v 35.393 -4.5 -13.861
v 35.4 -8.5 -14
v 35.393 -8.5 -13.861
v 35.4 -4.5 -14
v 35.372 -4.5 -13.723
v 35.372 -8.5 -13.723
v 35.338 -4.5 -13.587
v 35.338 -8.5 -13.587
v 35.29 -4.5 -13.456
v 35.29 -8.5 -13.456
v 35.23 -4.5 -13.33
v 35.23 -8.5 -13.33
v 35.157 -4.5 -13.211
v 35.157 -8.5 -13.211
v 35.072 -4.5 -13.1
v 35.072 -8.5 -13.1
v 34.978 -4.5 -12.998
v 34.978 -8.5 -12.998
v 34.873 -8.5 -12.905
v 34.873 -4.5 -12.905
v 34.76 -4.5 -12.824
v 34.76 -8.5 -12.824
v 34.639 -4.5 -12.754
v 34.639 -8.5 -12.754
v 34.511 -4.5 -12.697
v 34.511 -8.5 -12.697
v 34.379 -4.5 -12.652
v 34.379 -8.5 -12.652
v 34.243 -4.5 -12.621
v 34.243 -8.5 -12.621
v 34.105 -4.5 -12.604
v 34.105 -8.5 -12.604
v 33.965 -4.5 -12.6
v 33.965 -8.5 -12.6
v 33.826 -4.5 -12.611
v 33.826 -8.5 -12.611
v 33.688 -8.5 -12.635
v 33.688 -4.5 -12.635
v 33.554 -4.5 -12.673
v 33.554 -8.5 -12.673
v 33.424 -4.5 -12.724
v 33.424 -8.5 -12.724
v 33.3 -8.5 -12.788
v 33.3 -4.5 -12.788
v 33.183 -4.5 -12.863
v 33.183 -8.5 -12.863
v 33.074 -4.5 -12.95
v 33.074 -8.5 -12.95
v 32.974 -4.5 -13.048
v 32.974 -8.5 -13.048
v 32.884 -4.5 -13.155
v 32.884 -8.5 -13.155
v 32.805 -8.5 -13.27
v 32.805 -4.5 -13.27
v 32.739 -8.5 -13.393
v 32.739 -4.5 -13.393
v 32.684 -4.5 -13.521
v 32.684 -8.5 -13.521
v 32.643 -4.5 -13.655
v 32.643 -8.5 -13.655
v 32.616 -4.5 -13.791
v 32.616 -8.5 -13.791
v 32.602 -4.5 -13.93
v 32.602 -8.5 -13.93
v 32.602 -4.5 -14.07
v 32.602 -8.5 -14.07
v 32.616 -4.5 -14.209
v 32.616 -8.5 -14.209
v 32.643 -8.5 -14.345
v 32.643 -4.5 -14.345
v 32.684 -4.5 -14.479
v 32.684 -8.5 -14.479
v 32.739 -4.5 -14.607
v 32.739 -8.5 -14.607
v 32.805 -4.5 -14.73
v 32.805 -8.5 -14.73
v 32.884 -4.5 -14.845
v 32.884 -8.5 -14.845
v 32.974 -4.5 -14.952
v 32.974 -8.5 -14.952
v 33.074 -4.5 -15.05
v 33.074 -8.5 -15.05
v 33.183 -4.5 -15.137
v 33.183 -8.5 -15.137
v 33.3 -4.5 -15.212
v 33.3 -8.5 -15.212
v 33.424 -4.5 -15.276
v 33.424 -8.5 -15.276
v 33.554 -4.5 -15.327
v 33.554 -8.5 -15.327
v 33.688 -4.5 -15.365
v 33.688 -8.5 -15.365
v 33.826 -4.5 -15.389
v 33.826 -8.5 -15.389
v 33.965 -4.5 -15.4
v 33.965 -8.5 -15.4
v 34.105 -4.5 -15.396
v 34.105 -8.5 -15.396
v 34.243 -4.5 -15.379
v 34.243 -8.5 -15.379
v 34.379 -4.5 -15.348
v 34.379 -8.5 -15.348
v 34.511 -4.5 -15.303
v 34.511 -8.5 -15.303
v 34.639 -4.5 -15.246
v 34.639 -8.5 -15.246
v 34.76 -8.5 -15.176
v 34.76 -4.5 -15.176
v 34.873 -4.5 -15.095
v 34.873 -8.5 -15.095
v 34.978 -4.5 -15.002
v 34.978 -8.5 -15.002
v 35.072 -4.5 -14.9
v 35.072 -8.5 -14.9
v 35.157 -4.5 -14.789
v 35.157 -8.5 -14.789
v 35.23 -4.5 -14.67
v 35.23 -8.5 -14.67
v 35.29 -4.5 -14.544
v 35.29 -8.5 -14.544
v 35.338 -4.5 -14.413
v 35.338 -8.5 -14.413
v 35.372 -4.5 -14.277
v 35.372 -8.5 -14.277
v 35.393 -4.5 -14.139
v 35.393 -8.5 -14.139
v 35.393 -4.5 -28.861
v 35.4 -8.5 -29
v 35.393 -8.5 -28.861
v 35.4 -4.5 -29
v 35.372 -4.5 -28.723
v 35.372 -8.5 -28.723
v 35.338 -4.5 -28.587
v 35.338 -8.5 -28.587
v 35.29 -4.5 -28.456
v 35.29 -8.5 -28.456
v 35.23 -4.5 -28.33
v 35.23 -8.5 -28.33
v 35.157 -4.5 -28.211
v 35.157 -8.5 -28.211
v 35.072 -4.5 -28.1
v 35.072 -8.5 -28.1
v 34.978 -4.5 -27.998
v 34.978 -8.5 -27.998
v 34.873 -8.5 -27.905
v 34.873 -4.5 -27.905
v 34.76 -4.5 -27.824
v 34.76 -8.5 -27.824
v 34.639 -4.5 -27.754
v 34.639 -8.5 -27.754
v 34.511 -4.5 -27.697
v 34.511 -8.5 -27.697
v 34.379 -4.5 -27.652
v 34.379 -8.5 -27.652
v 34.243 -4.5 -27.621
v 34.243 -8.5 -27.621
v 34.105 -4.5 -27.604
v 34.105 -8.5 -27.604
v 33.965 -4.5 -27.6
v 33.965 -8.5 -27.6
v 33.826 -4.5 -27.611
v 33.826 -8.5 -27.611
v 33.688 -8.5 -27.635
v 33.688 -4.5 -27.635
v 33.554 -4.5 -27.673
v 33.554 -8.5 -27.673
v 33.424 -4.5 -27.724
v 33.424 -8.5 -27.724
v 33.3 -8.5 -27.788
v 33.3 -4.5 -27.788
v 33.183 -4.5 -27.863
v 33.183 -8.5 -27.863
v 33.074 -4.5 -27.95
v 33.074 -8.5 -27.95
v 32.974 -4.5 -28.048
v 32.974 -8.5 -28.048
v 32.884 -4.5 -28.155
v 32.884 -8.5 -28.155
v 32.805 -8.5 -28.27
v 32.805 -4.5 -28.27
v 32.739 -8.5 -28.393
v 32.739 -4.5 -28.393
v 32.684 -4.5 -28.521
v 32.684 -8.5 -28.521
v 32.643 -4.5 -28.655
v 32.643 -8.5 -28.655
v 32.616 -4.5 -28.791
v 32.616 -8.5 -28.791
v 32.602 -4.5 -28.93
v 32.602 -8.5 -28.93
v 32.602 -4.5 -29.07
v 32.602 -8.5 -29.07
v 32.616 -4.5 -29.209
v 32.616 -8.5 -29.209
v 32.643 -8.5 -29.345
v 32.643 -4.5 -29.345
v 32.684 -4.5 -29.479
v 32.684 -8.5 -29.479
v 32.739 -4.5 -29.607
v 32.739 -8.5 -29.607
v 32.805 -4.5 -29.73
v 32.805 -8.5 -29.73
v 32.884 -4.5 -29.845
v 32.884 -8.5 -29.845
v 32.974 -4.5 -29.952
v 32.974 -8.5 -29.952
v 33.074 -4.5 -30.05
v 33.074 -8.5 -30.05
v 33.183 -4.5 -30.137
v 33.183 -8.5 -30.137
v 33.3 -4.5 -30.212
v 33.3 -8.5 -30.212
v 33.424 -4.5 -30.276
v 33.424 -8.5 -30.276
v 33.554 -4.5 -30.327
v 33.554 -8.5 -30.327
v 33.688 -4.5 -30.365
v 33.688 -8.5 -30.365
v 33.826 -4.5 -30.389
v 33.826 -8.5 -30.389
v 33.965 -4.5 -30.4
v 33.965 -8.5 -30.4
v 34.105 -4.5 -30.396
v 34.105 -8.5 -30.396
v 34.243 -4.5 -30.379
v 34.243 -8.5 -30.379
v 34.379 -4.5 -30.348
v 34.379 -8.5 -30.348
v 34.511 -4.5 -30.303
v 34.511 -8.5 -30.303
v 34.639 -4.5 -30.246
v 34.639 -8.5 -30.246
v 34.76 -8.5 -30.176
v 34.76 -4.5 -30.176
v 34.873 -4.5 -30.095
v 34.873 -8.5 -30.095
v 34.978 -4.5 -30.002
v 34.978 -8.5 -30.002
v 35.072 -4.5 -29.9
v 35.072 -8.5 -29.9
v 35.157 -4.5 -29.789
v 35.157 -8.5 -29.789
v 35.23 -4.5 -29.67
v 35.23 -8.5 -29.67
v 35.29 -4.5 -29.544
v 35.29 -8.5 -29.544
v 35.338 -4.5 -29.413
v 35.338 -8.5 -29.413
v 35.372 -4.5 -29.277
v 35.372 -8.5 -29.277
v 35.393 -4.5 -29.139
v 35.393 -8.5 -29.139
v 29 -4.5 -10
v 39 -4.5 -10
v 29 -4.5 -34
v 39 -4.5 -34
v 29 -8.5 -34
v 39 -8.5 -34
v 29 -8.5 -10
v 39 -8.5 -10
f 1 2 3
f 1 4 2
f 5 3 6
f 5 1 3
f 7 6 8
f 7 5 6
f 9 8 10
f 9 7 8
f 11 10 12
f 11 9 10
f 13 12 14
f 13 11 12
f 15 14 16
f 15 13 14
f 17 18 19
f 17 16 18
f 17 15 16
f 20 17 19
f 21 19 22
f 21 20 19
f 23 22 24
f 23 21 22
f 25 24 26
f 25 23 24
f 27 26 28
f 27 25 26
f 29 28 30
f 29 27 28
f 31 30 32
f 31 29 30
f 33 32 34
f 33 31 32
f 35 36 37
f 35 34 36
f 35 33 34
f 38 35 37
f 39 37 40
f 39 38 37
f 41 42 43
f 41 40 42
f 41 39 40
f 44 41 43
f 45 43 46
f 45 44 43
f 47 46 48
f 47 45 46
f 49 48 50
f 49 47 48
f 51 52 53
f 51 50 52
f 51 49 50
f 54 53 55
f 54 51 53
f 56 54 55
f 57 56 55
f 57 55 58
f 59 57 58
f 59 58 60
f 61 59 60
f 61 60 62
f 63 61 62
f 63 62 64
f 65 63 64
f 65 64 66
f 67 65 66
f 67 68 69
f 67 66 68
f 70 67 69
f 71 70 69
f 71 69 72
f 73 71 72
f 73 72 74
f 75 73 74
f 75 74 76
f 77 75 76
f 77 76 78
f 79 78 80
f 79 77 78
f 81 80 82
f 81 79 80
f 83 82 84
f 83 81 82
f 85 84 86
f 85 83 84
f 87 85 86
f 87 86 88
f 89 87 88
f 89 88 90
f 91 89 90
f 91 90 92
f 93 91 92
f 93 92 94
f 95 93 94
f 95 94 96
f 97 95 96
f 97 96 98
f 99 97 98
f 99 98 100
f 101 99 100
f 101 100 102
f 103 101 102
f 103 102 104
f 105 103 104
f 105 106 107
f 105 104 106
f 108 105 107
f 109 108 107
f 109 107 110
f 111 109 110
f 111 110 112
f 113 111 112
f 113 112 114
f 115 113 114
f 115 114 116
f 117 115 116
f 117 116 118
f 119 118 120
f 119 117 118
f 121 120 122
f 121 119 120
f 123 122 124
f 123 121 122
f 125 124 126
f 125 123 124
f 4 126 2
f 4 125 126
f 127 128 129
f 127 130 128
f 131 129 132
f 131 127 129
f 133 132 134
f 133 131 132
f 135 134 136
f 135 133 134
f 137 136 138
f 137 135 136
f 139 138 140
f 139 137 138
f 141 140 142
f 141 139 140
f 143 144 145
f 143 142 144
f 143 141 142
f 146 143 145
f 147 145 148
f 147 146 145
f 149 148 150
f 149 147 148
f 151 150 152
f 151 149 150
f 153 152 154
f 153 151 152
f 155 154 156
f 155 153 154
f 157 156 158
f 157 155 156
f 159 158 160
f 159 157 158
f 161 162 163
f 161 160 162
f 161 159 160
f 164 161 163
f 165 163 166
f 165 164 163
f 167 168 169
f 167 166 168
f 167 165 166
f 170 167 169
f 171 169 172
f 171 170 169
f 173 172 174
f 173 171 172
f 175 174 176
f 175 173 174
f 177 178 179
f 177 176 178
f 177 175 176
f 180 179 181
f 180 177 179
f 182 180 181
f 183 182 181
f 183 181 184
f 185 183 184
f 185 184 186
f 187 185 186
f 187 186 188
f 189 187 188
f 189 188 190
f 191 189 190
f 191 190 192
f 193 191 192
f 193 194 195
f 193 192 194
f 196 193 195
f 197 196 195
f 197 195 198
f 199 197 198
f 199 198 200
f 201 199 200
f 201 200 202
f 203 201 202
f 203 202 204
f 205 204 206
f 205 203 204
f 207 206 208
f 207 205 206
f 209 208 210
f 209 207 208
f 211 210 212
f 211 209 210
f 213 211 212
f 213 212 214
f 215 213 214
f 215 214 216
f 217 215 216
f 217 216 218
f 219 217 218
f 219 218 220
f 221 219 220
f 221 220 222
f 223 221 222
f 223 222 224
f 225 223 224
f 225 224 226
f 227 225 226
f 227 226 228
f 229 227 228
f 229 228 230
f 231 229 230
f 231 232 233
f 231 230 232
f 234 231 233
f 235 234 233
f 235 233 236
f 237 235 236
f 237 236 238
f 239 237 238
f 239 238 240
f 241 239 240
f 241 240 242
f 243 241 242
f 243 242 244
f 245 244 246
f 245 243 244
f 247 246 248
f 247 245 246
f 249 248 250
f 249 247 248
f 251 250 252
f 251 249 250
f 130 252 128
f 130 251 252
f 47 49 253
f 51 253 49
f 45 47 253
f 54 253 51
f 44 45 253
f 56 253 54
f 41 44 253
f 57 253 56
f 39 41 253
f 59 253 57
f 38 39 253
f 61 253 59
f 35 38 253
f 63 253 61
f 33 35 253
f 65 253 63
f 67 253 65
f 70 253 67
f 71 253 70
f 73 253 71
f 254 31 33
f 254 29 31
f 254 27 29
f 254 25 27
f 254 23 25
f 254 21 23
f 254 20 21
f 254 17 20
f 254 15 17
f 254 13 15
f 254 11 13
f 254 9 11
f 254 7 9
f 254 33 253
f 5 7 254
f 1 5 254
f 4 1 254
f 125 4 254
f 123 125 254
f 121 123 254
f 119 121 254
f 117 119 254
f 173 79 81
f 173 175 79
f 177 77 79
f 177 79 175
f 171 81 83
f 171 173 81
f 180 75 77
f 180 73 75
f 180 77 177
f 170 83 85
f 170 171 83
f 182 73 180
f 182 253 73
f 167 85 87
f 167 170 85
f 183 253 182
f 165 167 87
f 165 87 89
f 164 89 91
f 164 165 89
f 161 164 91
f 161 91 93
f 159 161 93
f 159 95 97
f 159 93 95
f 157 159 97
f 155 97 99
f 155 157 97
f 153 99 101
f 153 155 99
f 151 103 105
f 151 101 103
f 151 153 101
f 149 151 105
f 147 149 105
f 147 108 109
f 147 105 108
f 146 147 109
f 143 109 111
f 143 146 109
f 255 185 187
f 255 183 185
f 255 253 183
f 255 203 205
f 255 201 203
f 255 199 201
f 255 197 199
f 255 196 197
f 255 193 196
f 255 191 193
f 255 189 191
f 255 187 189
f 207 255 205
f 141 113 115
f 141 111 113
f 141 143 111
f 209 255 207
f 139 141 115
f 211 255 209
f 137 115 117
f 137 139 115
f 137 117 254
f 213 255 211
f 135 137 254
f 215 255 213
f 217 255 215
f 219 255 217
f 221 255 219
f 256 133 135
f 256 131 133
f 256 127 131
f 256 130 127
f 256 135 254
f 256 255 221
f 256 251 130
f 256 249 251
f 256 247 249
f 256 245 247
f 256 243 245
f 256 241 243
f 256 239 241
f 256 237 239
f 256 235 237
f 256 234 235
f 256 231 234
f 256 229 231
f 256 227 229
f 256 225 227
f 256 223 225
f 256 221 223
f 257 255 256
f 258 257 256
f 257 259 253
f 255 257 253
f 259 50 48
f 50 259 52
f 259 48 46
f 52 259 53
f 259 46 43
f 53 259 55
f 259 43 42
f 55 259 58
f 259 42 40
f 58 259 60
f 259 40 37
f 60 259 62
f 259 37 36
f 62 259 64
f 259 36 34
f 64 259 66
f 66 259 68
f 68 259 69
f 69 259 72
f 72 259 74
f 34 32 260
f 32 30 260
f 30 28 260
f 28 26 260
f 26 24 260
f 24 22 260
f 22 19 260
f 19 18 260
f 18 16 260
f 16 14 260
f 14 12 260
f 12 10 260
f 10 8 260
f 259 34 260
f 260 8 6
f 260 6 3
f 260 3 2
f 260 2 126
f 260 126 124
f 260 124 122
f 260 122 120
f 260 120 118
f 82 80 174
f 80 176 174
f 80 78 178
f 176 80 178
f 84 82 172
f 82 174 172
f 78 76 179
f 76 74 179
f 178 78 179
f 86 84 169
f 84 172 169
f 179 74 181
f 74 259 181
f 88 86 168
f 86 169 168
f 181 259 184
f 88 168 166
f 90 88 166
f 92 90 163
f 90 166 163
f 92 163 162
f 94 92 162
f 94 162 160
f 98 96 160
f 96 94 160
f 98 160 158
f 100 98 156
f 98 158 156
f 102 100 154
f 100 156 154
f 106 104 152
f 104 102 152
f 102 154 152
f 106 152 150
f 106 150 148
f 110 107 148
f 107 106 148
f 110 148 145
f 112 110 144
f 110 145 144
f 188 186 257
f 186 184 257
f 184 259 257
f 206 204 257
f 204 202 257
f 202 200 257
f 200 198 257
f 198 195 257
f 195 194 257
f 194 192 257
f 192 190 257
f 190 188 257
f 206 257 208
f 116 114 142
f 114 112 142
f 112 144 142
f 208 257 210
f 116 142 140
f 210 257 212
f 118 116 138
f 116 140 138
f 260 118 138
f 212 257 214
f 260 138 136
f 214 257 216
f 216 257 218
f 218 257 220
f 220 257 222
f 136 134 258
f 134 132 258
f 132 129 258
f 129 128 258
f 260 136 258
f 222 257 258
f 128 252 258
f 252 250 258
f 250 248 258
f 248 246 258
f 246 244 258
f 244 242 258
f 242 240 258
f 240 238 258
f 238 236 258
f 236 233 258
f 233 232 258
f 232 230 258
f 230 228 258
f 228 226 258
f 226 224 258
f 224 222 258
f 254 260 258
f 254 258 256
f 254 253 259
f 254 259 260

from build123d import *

# Parameters (mm, degrees)
CYLINDER231_R          = 1.4
CYLINDER231_DEPTH      = 20
CYLINDER231_ROLL_ANGLE = 90
CYLINDER230_R          = 1.4
CYLINDER230_DEPTH      = 20
CYLINDER230_ROLL_ANGLE = 90
BOX001027045174_W      = 10
BOX001027045174_H      = 4
BOX001027045174_DEPTH  = 24


with BuildPart() as m3_tap006:
    # Cylinder231 → Cylinder231 (new body)
    with BuildSketch(Plane.XY):
        Circle(CYLINDER231_R)
    extrude(amount=CYLINDER231_DEPTH)


with BuildPart() as m3_tap006_1:
    # Cylinder231 roll: moved
    add(m3_tap006.part.rotate(Axis((0, 0, 0), (1, 0, 0)), CYLINDER231_ROLL_ANGLE))


with BuildPart() as m3_tap006_2:
    # Cylinder231 placement: moved
    add(m3_tap006_1.part.moved(Location((34, 5, -29))))


with BuildPart() as fusion112123:
    # Cylinder230 → Cylinder230 (new body)
    with BuildSketch(Plane.XY):
        Circle(CYLINDER230_R)
    extrude(amount=CYLINDER230_DEPTH)


with BuildPart() as fusion112123_1:
    # Cylinder230 roll: moved
    add(fusion112123.part.rotate(Axis((0, 0, 0), (1, 0, 0)), CYLINDER230_ROLL_ANGLE))


with BuildPart() as fusion112123_2:
    # Cylinder230 placement: moved
    add(fusion112123_1.part.moved(Location((34, 5, -14))))

    # Fusion112123: union M3-tap006
    add(m3_tap006_2.part)


with BuildPart() as join_plate:
    # Box001027045174 → Box001027045174 (new body)
    with BuildSketch(Plane(origin=(29, -8.5, -34), x_dir=(1, 0, 0), z_dir=(0, 0, 1))):
        with Locations((5, 2)):
            Rectangle(BOX001027045174_W, BOX001027045174_H)
    extrude(amount=BOX001027045174_DEPTH)

    # Cut209: cut Fusion112123
    add(fusion112123_2.part, mode=Mode.SUBTRACT)


solid = join_plate.part
